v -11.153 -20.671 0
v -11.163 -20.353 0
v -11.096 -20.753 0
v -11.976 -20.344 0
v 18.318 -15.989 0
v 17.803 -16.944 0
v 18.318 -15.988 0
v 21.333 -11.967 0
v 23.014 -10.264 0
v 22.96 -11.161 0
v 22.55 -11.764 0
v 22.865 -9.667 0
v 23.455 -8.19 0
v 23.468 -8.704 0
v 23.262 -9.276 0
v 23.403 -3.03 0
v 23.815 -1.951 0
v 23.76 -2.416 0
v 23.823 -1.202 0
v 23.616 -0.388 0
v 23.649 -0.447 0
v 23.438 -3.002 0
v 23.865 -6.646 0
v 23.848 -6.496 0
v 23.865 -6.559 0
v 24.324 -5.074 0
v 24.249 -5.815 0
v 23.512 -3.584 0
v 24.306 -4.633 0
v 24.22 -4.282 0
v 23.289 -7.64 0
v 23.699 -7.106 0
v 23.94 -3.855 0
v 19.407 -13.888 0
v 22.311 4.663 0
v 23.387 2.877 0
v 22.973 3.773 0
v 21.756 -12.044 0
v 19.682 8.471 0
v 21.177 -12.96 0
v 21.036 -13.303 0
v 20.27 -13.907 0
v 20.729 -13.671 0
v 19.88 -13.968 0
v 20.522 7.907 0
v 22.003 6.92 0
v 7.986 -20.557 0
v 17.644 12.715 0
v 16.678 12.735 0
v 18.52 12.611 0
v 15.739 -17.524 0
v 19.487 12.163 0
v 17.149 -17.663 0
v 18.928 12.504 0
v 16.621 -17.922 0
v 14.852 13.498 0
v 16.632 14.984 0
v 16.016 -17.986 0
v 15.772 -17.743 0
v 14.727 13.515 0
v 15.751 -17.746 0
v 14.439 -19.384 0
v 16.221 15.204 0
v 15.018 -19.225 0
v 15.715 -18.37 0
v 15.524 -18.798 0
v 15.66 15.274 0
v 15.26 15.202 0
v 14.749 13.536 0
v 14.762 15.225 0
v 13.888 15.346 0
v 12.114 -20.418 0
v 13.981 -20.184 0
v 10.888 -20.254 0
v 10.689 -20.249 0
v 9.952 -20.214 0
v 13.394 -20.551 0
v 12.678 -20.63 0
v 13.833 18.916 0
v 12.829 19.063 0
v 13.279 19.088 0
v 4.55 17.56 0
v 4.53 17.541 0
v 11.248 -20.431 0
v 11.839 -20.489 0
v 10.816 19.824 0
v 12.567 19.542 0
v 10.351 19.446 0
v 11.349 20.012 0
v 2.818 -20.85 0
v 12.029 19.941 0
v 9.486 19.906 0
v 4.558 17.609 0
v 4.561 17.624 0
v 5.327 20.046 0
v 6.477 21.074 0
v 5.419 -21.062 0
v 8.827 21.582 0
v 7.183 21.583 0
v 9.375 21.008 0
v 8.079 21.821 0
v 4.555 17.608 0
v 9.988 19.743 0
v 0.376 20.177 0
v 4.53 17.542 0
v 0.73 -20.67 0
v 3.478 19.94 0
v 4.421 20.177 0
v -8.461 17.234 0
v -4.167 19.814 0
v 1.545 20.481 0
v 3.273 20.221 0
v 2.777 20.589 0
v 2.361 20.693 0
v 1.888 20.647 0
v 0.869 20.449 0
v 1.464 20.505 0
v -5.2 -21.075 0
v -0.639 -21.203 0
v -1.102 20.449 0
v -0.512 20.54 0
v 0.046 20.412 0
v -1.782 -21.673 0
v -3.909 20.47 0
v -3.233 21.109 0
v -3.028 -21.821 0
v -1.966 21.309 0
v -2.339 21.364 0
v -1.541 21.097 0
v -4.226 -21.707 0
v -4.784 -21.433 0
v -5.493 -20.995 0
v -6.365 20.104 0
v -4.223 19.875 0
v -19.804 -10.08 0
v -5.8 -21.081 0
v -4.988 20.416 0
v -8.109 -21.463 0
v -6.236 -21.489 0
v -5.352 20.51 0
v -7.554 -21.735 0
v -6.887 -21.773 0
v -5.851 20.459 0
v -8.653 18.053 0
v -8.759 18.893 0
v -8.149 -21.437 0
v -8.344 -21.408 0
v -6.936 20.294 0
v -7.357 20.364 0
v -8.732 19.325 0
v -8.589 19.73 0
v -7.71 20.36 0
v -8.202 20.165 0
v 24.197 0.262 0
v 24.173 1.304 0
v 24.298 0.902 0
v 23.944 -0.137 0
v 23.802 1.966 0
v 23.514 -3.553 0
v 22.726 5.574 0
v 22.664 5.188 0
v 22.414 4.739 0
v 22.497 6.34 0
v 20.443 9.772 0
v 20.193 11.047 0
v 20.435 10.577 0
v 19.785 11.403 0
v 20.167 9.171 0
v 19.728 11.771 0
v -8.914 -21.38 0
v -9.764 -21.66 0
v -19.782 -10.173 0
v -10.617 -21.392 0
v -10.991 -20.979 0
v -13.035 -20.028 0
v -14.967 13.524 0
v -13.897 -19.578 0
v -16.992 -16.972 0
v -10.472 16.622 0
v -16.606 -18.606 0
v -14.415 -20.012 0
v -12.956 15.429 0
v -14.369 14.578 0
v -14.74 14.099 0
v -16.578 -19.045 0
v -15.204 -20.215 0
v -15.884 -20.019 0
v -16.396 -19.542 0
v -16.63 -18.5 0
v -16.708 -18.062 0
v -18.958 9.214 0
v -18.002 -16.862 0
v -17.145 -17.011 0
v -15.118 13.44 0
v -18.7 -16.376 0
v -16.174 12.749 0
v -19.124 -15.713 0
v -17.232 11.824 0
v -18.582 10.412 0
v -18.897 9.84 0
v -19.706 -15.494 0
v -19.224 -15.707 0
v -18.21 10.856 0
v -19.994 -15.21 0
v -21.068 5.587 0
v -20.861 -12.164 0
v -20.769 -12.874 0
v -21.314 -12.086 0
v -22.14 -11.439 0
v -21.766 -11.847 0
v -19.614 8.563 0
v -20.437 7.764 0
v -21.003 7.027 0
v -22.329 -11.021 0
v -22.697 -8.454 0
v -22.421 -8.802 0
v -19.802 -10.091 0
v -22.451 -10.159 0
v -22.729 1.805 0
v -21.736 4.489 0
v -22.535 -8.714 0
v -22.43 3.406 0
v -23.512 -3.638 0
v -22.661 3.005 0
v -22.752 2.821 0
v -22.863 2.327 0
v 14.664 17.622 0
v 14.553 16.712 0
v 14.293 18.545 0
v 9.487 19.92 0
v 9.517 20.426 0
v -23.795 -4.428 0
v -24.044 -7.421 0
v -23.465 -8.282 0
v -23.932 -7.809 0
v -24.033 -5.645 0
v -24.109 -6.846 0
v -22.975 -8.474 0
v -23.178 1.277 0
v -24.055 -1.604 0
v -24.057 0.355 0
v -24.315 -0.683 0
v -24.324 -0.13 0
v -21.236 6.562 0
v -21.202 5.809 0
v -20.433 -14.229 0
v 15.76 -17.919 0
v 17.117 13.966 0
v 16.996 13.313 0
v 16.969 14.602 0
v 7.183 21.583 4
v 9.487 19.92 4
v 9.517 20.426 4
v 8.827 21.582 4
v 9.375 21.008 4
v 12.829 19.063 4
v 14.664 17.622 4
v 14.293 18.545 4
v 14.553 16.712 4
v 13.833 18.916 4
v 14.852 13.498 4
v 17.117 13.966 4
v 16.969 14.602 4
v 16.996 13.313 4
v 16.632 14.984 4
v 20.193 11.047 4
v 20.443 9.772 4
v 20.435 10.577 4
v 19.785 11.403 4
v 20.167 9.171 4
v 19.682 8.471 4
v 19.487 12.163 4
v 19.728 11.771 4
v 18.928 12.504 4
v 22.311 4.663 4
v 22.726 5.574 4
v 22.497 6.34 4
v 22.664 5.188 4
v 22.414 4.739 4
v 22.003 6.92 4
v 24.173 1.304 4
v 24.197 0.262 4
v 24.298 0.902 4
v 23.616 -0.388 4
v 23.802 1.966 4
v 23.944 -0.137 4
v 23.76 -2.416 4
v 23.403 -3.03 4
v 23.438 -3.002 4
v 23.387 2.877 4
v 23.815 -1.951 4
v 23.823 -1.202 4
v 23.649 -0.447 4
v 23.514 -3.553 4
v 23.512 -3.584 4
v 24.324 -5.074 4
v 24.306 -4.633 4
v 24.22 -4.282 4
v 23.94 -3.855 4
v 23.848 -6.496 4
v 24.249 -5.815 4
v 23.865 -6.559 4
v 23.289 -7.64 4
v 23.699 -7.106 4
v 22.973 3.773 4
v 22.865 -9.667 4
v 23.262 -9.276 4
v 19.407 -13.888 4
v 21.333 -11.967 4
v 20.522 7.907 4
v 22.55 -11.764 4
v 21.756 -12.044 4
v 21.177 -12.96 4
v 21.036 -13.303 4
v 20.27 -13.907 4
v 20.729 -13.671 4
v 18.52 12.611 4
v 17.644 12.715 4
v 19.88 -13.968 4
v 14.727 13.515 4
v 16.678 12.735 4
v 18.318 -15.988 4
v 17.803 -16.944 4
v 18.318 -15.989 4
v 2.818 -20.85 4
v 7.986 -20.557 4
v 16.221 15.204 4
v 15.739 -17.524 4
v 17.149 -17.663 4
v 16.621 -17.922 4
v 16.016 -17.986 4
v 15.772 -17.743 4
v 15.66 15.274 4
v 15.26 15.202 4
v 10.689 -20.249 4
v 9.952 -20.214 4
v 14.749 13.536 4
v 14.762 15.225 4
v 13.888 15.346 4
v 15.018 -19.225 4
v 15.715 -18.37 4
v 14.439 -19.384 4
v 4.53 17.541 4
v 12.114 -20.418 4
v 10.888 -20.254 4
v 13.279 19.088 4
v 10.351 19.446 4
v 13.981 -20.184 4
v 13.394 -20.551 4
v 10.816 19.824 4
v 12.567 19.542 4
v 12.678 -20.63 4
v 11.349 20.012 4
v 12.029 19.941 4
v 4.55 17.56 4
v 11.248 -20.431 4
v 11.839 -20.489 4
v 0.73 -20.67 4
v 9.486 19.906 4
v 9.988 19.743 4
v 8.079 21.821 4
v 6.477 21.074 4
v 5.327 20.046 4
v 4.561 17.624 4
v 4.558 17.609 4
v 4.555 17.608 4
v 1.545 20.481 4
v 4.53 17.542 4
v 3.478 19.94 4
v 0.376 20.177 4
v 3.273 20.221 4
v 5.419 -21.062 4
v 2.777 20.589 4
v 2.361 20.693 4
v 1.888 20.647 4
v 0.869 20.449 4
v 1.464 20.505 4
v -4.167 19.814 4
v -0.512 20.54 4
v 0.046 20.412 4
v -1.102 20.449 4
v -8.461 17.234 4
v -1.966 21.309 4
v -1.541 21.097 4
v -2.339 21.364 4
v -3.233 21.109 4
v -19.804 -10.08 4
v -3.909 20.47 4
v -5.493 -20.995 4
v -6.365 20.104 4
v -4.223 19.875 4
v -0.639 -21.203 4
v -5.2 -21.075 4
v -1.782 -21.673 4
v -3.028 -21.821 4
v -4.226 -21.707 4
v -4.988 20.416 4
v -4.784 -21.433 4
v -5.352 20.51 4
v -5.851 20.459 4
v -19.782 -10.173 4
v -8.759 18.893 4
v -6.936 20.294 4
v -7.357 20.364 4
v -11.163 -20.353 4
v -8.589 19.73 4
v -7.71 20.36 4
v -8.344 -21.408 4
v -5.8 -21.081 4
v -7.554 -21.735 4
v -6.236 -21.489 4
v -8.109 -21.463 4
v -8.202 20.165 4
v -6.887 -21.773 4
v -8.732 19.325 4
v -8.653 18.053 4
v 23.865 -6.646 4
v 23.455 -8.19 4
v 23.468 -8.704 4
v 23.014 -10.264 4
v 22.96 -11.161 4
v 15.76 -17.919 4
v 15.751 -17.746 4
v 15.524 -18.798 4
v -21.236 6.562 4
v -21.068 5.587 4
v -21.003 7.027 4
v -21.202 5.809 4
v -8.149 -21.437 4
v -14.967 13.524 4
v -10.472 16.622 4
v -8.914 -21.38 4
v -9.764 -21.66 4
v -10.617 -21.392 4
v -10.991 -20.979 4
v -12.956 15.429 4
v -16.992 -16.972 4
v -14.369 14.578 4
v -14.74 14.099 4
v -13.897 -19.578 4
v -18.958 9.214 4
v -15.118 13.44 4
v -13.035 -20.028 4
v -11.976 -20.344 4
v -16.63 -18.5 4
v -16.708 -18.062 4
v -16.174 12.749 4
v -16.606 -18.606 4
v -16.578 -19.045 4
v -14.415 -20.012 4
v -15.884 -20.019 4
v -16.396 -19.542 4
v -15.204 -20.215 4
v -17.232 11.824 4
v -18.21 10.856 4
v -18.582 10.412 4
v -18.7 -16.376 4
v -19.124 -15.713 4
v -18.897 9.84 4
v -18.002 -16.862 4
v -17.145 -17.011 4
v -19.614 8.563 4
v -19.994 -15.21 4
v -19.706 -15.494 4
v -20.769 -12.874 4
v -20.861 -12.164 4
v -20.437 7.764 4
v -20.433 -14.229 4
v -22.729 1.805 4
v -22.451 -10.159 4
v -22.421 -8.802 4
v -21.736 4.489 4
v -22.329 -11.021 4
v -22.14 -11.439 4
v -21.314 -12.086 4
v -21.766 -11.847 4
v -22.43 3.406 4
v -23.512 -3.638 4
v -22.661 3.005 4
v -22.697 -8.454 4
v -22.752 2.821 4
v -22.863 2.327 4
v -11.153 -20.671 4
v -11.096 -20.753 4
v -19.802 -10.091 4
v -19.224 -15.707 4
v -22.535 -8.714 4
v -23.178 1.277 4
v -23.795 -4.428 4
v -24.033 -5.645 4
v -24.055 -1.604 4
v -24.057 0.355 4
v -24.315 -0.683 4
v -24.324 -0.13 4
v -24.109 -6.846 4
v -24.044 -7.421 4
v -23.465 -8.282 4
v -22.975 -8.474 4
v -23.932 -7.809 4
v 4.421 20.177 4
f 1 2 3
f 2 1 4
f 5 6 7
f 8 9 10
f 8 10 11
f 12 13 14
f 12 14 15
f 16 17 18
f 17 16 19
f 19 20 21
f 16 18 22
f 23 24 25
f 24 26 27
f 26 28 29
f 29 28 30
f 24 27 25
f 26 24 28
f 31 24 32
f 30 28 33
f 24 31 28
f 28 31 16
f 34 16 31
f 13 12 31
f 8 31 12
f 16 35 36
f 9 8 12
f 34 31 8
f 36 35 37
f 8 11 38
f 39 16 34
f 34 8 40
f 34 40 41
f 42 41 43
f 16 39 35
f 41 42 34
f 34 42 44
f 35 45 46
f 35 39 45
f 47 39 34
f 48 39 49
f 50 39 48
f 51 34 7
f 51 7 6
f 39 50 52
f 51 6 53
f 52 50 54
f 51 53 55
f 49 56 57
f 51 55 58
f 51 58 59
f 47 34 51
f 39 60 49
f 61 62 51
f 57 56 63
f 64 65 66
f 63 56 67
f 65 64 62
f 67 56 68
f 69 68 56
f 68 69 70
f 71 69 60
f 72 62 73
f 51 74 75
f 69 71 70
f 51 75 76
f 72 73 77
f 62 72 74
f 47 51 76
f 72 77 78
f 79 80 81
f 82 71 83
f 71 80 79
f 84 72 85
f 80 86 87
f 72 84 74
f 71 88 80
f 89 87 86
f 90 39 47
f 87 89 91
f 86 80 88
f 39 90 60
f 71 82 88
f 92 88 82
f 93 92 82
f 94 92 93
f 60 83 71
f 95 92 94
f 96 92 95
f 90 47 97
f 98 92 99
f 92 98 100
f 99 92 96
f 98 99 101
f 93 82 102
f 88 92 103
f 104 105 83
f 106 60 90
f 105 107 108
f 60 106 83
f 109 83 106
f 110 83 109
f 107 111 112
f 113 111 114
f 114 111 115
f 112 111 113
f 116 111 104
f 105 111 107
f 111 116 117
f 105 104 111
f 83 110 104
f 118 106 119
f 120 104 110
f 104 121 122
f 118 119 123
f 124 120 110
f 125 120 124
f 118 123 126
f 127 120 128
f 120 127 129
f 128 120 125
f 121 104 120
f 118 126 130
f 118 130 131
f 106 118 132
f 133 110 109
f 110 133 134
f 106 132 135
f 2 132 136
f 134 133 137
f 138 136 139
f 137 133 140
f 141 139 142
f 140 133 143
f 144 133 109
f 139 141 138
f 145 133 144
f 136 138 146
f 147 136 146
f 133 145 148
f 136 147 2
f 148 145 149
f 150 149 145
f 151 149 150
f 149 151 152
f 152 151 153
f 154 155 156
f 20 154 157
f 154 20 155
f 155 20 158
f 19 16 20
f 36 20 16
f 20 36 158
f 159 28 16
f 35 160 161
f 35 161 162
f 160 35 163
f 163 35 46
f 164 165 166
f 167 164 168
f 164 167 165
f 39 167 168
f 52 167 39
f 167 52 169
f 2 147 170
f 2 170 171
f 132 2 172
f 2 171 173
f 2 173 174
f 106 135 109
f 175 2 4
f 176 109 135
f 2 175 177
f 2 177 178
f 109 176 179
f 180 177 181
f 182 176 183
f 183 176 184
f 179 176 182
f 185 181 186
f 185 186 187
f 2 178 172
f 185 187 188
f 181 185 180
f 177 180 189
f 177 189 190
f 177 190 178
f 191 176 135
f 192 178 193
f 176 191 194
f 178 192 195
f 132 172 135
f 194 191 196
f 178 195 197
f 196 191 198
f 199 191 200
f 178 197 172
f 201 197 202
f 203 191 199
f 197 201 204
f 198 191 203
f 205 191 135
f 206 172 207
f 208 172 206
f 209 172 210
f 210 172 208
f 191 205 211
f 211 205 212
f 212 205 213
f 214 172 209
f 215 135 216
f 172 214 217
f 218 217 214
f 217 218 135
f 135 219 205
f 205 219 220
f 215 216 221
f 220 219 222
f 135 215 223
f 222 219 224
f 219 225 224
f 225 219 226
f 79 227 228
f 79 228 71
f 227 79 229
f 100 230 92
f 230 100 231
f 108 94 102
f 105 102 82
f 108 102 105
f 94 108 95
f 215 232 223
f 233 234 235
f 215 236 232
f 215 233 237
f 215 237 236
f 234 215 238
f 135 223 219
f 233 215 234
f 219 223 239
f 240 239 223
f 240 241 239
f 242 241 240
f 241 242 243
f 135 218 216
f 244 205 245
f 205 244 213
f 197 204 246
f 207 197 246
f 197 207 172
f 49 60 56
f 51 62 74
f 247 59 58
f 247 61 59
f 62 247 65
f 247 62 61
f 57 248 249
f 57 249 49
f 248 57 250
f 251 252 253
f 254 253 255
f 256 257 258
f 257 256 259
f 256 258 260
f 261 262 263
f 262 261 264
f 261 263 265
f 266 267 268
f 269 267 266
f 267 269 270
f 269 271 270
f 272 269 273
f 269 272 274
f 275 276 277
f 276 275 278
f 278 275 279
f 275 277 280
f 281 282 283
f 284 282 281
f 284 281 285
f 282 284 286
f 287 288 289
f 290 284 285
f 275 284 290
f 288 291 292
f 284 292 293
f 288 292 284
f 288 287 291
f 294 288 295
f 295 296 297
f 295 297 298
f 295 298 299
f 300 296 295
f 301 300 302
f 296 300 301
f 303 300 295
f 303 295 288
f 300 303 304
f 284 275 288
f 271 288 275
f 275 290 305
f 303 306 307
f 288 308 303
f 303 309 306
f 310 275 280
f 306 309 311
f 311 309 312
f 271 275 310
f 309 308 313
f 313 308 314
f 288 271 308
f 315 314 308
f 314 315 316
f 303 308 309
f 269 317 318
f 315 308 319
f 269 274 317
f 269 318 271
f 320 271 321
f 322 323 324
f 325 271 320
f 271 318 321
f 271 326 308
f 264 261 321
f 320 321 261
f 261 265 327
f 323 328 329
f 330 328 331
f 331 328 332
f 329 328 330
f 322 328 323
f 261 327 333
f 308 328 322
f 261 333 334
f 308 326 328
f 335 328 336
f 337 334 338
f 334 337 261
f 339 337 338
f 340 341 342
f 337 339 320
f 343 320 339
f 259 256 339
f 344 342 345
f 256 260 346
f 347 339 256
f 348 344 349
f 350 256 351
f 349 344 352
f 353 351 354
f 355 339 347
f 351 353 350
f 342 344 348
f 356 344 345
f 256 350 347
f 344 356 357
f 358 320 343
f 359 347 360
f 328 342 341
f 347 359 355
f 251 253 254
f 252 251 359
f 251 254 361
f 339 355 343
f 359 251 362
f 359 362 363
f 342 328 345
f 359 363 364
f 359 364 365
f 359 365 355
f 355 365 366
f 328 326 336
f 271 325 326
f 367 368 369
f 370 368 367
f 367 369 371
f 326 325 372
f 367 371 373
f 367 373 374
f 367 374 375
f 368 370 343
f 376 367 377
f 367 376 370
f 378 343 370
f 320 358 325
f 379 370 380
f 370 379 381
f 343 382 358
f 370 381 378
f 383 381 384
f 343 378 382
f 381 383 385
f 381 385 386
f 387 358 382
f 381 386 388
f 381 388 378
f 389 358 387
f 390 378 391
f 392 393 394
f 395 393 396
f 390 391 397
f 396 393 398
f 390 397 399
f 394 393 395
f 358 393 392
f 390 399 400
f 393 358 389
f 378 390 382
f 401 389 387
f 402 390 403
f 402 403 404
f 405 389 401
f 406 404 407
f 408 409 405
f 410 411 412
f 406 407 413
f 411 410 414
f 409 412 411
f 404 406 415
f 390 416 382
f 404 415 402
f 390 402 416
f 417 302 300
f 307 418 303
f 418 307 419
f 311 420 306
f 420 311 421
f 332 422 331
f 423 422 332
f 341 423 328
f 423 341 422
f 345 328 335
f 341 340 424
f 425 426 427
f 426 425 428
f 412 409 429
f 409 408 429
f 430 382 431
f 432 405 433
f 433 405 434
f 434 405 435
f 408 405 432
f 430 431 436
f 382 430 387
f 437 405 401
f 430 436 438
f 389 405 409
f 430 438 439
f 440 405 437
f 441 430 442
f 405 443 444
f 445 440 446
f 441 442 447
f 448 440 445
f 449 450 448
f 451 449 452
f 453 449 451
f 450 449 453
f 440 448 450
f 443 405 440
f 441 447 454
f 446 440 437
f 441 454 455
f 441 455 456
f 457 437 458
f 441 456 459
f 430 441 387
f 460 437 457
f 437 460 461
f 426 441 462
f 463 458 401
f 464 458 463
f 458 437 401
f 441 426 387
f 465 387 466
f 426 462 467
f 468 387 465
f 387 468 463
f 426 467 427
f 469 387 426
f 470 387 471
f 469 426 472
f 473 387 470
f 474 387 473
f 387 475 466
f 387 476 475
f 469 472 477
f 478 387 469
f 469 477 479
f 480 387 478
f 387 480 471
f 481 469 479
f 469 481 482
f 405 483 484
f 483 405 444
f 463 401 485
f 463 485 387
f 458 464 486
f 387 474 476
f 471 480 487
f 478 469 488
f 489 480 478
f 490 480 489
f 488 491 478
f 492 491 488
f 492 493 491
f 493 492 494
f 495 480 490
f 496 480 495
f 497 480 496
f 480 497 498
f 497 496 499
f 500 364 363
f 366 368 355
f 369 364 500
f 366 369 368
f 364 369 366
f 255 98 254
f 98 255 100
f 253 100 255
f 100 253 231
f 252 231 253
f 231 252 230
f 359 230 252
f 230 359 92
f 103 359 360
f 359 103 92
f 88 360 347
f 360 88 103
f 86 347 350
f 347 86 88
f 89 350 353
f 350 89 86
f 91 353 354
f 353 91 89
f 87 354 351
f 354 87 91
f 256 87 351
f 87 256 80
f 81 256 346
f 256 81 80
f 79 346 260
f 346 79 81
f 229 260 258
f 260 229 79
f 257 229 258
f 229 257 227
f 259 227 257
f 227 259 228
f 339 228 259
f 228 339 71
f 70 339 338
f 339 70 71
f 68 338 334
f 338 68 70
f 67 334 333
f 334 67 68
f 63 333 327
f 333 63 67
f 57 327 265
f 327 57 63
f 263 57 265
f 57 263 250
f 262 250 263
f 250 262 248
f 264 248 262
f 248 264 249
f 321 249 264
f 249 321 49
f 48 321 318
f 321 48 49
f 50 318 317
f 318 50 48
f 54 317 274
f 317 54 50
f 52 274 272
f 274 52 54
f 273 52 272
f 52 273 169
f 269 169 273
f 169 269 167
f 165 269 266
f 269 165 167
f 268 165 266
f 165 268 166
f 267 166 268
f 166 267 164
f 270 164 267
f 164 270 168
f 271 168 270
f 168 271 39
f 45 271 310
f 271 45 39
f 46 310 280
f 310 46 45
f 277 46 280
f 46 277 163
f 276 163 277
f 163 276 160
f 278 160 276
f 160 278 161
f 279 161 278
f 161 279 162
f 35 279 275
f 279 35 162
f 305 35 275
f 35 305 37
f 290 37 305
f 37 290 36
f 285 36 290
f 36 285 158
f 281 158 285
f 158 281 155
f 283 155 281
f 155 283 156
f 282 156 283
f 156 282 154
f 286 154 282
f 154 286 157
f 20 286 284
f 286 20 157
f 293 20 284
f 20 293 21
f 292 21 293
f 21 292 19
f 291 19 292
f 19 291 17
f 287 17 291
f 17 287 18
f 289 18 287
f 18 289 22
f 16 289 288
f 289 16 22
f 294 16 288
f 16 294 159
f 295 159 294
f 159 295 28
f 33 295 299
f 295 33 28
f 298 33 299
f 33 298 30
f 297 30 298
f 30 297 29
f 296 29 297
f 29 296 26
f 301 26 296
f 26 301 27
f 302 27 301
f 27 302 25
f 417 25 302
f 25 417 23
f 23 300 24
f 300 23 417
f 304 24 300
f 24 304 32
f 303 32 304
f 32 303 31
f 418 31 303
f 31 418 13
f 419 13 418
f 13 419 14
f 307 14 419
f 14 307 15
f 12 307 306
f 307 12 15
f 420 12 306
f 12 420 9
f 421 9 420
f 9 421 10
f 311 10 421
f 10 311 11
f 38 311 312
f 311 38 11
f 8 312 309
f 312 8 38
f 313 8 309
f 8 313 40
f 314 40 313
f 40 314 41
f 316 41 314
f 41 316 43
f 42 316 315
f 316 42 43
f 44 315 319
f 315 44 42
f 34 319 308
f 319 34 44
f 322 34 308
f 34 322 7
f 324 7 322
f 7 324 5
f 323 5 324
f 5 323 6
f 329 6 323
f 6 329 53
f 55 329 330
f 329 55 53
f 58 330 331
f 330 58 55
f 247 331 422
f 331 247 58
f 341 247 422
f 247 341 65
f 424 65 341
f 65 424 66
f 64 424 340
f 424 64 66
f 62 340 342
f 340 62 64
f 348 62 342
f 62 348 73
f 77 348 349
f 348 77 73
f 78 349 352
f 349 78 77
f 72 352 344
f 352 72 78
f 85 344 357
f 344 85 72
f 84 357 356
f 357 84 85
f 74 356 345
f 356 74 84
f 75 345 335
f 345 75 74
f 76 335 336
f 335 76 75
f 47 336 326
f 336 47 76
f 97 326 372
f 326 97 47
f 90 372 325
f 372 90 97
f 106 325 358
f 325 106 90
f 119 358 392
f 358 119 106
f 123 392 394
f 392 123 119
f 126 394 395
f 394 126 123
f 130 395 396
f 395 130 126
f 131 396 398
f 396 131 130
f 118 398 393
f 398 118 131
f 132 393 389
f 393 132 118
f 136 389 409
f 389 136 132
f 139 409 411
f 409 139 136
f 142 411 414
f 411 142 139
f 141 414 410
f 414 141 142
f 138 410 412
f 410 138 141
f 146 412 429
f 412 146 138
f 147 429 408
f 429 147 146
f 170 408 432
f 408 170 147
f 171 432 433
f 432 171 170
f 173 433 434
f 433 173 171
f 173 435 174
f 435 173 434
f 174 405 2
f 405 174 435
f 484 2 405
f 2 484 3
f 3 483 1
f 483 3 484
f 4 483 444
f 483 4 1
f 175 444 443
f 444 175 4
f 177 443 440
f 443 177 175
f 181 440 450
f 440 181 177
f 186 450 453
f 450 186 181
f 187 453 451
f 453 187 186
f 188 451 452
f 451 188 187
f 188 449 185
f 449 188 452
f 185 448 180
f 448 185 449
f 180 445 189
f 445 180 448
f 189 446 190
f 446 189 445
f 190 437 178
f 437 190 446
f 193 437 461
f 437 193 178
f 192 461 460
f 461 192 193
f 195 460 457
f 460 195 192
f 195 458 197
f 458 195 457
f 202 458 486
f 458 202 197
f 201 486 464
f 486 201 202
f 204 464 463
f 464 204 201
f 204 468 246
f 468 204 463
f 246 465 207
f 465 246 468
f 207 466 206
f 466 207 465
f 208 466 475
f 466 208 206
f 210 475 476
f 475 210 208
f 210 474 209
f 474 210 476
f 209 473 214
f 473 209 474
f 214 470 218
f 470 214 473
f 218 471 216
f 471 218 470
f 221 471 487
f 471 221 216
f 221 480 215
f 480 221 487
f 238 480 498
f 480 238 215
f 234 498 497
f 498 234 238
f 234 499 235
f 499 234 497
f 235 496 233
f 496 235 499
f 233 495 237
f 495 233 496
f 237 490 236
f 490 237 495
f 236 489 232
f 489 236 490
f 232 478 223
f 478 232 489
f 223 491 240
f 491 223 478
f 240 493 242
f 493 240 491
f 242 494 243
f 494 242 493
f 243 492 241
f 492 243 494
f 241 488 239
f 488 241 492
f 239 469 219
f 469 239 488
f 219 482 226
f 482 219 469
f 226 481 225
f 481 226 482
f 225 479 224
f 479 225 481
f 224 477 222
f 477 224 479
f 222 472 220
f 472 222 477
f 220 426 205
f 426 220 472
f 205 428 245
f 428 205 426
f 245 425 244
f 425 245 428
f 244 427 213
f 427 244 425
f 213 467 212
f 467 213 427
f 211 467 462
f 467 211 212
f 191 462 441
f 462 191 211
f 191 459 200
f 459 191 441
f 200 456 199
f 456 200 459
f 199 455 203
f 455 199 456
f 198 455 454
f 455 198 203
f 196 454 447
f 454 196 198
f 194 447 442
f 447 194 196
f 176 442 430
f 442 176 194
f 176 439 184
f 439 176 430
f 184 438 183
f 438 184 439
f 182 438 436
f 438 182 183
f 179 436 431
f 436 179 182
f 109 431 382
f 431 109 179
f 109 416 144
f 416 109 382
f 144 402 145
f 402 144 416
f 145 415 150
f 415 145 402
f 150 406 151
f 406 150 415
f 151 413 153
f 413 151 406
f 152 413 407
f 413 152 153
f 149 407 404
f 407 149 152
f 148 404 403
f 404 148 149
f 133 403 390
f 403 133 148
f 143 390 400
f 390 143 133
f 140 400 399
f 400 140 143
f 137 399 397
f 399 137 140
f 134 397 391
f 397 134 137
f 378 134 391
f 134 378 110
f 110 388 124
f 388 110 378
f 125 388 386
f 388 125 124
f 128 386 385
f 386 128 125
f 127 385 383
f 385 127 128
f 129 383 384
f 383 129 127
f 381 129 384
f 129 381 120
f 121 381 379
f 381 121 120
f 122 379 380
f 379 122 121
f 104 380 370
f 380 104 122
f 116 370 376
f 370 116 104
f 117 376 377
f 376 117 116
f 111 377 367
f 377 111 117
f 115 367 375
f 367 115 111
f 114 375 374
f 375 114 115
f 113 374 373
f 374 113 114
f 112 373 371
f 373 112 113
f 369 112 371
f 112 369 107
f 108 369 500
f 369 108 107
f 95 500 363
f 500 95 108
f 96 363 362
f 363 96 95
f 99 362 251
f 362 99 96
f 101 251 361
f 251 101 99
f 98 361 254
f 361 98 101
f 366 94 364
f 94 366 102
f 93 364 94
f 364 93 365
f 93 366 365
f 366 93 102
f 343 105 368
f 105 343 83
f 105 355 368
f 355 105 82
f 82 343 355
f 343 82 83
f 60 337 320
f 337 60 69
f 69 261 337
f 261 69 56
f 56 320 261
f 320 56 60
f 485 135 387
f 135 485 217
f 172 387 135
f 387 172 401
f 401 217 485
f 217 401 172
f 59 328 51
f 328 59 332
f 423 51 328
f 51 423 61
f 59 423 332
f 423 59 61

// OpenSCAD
// file: makkurokursukeB_01.scad
// Module names are of the form poly_<inkscape-path-id>().  As a result,
// you can associate a polygon in this OpenSCAD program with the corresponding
// SVG element in the Inkscape document by looking for the XML element with
// the attribute id="inkscape-path-id".

// fudge value is used to ensure that subtracted solids are a tad taller
// in the z dimension than the polygon being subtracted from.  This helps
// keep the resulting .stl file manifold.
fudge = 0.1;

module poly_rect414436(h)
{
  scale([25.4/90, -25.4/90, 1]) union()
  {
    linear_extrude(height=h)
      polygon([[17.064450,-70.249999],[17.064450,12.900388],[-10.000000,12.900388],[-10.000000,-65.749999],[-24.369141,-65.749999],[-24.369141,12.900388],[-77.500000,12.900388],[-77.500000,27.269528],[-24.369141,27.269528],[-24.369141,70.249998],[-10.000000,70.249998],[-10.000000,27.269528],[17.064450,27.269528],[17.064450,68.749998],[31.433590,68.749998],[31.433590,27.269528],[77.500000,27.269528],[77.500000,12.900388],[31.433590,12.900388],[31.433590,-70.249999],[17.064450,-70.249999]]);
  }
}

poly_rect414436(1.2000000476837158);
// main file
//include <makkurokursukeA_01.scad>
//include <makkurokursukeA_02.scad>
include <makkurokursukeB_01.scad>
include <makkurokursukeB_02.scad>
